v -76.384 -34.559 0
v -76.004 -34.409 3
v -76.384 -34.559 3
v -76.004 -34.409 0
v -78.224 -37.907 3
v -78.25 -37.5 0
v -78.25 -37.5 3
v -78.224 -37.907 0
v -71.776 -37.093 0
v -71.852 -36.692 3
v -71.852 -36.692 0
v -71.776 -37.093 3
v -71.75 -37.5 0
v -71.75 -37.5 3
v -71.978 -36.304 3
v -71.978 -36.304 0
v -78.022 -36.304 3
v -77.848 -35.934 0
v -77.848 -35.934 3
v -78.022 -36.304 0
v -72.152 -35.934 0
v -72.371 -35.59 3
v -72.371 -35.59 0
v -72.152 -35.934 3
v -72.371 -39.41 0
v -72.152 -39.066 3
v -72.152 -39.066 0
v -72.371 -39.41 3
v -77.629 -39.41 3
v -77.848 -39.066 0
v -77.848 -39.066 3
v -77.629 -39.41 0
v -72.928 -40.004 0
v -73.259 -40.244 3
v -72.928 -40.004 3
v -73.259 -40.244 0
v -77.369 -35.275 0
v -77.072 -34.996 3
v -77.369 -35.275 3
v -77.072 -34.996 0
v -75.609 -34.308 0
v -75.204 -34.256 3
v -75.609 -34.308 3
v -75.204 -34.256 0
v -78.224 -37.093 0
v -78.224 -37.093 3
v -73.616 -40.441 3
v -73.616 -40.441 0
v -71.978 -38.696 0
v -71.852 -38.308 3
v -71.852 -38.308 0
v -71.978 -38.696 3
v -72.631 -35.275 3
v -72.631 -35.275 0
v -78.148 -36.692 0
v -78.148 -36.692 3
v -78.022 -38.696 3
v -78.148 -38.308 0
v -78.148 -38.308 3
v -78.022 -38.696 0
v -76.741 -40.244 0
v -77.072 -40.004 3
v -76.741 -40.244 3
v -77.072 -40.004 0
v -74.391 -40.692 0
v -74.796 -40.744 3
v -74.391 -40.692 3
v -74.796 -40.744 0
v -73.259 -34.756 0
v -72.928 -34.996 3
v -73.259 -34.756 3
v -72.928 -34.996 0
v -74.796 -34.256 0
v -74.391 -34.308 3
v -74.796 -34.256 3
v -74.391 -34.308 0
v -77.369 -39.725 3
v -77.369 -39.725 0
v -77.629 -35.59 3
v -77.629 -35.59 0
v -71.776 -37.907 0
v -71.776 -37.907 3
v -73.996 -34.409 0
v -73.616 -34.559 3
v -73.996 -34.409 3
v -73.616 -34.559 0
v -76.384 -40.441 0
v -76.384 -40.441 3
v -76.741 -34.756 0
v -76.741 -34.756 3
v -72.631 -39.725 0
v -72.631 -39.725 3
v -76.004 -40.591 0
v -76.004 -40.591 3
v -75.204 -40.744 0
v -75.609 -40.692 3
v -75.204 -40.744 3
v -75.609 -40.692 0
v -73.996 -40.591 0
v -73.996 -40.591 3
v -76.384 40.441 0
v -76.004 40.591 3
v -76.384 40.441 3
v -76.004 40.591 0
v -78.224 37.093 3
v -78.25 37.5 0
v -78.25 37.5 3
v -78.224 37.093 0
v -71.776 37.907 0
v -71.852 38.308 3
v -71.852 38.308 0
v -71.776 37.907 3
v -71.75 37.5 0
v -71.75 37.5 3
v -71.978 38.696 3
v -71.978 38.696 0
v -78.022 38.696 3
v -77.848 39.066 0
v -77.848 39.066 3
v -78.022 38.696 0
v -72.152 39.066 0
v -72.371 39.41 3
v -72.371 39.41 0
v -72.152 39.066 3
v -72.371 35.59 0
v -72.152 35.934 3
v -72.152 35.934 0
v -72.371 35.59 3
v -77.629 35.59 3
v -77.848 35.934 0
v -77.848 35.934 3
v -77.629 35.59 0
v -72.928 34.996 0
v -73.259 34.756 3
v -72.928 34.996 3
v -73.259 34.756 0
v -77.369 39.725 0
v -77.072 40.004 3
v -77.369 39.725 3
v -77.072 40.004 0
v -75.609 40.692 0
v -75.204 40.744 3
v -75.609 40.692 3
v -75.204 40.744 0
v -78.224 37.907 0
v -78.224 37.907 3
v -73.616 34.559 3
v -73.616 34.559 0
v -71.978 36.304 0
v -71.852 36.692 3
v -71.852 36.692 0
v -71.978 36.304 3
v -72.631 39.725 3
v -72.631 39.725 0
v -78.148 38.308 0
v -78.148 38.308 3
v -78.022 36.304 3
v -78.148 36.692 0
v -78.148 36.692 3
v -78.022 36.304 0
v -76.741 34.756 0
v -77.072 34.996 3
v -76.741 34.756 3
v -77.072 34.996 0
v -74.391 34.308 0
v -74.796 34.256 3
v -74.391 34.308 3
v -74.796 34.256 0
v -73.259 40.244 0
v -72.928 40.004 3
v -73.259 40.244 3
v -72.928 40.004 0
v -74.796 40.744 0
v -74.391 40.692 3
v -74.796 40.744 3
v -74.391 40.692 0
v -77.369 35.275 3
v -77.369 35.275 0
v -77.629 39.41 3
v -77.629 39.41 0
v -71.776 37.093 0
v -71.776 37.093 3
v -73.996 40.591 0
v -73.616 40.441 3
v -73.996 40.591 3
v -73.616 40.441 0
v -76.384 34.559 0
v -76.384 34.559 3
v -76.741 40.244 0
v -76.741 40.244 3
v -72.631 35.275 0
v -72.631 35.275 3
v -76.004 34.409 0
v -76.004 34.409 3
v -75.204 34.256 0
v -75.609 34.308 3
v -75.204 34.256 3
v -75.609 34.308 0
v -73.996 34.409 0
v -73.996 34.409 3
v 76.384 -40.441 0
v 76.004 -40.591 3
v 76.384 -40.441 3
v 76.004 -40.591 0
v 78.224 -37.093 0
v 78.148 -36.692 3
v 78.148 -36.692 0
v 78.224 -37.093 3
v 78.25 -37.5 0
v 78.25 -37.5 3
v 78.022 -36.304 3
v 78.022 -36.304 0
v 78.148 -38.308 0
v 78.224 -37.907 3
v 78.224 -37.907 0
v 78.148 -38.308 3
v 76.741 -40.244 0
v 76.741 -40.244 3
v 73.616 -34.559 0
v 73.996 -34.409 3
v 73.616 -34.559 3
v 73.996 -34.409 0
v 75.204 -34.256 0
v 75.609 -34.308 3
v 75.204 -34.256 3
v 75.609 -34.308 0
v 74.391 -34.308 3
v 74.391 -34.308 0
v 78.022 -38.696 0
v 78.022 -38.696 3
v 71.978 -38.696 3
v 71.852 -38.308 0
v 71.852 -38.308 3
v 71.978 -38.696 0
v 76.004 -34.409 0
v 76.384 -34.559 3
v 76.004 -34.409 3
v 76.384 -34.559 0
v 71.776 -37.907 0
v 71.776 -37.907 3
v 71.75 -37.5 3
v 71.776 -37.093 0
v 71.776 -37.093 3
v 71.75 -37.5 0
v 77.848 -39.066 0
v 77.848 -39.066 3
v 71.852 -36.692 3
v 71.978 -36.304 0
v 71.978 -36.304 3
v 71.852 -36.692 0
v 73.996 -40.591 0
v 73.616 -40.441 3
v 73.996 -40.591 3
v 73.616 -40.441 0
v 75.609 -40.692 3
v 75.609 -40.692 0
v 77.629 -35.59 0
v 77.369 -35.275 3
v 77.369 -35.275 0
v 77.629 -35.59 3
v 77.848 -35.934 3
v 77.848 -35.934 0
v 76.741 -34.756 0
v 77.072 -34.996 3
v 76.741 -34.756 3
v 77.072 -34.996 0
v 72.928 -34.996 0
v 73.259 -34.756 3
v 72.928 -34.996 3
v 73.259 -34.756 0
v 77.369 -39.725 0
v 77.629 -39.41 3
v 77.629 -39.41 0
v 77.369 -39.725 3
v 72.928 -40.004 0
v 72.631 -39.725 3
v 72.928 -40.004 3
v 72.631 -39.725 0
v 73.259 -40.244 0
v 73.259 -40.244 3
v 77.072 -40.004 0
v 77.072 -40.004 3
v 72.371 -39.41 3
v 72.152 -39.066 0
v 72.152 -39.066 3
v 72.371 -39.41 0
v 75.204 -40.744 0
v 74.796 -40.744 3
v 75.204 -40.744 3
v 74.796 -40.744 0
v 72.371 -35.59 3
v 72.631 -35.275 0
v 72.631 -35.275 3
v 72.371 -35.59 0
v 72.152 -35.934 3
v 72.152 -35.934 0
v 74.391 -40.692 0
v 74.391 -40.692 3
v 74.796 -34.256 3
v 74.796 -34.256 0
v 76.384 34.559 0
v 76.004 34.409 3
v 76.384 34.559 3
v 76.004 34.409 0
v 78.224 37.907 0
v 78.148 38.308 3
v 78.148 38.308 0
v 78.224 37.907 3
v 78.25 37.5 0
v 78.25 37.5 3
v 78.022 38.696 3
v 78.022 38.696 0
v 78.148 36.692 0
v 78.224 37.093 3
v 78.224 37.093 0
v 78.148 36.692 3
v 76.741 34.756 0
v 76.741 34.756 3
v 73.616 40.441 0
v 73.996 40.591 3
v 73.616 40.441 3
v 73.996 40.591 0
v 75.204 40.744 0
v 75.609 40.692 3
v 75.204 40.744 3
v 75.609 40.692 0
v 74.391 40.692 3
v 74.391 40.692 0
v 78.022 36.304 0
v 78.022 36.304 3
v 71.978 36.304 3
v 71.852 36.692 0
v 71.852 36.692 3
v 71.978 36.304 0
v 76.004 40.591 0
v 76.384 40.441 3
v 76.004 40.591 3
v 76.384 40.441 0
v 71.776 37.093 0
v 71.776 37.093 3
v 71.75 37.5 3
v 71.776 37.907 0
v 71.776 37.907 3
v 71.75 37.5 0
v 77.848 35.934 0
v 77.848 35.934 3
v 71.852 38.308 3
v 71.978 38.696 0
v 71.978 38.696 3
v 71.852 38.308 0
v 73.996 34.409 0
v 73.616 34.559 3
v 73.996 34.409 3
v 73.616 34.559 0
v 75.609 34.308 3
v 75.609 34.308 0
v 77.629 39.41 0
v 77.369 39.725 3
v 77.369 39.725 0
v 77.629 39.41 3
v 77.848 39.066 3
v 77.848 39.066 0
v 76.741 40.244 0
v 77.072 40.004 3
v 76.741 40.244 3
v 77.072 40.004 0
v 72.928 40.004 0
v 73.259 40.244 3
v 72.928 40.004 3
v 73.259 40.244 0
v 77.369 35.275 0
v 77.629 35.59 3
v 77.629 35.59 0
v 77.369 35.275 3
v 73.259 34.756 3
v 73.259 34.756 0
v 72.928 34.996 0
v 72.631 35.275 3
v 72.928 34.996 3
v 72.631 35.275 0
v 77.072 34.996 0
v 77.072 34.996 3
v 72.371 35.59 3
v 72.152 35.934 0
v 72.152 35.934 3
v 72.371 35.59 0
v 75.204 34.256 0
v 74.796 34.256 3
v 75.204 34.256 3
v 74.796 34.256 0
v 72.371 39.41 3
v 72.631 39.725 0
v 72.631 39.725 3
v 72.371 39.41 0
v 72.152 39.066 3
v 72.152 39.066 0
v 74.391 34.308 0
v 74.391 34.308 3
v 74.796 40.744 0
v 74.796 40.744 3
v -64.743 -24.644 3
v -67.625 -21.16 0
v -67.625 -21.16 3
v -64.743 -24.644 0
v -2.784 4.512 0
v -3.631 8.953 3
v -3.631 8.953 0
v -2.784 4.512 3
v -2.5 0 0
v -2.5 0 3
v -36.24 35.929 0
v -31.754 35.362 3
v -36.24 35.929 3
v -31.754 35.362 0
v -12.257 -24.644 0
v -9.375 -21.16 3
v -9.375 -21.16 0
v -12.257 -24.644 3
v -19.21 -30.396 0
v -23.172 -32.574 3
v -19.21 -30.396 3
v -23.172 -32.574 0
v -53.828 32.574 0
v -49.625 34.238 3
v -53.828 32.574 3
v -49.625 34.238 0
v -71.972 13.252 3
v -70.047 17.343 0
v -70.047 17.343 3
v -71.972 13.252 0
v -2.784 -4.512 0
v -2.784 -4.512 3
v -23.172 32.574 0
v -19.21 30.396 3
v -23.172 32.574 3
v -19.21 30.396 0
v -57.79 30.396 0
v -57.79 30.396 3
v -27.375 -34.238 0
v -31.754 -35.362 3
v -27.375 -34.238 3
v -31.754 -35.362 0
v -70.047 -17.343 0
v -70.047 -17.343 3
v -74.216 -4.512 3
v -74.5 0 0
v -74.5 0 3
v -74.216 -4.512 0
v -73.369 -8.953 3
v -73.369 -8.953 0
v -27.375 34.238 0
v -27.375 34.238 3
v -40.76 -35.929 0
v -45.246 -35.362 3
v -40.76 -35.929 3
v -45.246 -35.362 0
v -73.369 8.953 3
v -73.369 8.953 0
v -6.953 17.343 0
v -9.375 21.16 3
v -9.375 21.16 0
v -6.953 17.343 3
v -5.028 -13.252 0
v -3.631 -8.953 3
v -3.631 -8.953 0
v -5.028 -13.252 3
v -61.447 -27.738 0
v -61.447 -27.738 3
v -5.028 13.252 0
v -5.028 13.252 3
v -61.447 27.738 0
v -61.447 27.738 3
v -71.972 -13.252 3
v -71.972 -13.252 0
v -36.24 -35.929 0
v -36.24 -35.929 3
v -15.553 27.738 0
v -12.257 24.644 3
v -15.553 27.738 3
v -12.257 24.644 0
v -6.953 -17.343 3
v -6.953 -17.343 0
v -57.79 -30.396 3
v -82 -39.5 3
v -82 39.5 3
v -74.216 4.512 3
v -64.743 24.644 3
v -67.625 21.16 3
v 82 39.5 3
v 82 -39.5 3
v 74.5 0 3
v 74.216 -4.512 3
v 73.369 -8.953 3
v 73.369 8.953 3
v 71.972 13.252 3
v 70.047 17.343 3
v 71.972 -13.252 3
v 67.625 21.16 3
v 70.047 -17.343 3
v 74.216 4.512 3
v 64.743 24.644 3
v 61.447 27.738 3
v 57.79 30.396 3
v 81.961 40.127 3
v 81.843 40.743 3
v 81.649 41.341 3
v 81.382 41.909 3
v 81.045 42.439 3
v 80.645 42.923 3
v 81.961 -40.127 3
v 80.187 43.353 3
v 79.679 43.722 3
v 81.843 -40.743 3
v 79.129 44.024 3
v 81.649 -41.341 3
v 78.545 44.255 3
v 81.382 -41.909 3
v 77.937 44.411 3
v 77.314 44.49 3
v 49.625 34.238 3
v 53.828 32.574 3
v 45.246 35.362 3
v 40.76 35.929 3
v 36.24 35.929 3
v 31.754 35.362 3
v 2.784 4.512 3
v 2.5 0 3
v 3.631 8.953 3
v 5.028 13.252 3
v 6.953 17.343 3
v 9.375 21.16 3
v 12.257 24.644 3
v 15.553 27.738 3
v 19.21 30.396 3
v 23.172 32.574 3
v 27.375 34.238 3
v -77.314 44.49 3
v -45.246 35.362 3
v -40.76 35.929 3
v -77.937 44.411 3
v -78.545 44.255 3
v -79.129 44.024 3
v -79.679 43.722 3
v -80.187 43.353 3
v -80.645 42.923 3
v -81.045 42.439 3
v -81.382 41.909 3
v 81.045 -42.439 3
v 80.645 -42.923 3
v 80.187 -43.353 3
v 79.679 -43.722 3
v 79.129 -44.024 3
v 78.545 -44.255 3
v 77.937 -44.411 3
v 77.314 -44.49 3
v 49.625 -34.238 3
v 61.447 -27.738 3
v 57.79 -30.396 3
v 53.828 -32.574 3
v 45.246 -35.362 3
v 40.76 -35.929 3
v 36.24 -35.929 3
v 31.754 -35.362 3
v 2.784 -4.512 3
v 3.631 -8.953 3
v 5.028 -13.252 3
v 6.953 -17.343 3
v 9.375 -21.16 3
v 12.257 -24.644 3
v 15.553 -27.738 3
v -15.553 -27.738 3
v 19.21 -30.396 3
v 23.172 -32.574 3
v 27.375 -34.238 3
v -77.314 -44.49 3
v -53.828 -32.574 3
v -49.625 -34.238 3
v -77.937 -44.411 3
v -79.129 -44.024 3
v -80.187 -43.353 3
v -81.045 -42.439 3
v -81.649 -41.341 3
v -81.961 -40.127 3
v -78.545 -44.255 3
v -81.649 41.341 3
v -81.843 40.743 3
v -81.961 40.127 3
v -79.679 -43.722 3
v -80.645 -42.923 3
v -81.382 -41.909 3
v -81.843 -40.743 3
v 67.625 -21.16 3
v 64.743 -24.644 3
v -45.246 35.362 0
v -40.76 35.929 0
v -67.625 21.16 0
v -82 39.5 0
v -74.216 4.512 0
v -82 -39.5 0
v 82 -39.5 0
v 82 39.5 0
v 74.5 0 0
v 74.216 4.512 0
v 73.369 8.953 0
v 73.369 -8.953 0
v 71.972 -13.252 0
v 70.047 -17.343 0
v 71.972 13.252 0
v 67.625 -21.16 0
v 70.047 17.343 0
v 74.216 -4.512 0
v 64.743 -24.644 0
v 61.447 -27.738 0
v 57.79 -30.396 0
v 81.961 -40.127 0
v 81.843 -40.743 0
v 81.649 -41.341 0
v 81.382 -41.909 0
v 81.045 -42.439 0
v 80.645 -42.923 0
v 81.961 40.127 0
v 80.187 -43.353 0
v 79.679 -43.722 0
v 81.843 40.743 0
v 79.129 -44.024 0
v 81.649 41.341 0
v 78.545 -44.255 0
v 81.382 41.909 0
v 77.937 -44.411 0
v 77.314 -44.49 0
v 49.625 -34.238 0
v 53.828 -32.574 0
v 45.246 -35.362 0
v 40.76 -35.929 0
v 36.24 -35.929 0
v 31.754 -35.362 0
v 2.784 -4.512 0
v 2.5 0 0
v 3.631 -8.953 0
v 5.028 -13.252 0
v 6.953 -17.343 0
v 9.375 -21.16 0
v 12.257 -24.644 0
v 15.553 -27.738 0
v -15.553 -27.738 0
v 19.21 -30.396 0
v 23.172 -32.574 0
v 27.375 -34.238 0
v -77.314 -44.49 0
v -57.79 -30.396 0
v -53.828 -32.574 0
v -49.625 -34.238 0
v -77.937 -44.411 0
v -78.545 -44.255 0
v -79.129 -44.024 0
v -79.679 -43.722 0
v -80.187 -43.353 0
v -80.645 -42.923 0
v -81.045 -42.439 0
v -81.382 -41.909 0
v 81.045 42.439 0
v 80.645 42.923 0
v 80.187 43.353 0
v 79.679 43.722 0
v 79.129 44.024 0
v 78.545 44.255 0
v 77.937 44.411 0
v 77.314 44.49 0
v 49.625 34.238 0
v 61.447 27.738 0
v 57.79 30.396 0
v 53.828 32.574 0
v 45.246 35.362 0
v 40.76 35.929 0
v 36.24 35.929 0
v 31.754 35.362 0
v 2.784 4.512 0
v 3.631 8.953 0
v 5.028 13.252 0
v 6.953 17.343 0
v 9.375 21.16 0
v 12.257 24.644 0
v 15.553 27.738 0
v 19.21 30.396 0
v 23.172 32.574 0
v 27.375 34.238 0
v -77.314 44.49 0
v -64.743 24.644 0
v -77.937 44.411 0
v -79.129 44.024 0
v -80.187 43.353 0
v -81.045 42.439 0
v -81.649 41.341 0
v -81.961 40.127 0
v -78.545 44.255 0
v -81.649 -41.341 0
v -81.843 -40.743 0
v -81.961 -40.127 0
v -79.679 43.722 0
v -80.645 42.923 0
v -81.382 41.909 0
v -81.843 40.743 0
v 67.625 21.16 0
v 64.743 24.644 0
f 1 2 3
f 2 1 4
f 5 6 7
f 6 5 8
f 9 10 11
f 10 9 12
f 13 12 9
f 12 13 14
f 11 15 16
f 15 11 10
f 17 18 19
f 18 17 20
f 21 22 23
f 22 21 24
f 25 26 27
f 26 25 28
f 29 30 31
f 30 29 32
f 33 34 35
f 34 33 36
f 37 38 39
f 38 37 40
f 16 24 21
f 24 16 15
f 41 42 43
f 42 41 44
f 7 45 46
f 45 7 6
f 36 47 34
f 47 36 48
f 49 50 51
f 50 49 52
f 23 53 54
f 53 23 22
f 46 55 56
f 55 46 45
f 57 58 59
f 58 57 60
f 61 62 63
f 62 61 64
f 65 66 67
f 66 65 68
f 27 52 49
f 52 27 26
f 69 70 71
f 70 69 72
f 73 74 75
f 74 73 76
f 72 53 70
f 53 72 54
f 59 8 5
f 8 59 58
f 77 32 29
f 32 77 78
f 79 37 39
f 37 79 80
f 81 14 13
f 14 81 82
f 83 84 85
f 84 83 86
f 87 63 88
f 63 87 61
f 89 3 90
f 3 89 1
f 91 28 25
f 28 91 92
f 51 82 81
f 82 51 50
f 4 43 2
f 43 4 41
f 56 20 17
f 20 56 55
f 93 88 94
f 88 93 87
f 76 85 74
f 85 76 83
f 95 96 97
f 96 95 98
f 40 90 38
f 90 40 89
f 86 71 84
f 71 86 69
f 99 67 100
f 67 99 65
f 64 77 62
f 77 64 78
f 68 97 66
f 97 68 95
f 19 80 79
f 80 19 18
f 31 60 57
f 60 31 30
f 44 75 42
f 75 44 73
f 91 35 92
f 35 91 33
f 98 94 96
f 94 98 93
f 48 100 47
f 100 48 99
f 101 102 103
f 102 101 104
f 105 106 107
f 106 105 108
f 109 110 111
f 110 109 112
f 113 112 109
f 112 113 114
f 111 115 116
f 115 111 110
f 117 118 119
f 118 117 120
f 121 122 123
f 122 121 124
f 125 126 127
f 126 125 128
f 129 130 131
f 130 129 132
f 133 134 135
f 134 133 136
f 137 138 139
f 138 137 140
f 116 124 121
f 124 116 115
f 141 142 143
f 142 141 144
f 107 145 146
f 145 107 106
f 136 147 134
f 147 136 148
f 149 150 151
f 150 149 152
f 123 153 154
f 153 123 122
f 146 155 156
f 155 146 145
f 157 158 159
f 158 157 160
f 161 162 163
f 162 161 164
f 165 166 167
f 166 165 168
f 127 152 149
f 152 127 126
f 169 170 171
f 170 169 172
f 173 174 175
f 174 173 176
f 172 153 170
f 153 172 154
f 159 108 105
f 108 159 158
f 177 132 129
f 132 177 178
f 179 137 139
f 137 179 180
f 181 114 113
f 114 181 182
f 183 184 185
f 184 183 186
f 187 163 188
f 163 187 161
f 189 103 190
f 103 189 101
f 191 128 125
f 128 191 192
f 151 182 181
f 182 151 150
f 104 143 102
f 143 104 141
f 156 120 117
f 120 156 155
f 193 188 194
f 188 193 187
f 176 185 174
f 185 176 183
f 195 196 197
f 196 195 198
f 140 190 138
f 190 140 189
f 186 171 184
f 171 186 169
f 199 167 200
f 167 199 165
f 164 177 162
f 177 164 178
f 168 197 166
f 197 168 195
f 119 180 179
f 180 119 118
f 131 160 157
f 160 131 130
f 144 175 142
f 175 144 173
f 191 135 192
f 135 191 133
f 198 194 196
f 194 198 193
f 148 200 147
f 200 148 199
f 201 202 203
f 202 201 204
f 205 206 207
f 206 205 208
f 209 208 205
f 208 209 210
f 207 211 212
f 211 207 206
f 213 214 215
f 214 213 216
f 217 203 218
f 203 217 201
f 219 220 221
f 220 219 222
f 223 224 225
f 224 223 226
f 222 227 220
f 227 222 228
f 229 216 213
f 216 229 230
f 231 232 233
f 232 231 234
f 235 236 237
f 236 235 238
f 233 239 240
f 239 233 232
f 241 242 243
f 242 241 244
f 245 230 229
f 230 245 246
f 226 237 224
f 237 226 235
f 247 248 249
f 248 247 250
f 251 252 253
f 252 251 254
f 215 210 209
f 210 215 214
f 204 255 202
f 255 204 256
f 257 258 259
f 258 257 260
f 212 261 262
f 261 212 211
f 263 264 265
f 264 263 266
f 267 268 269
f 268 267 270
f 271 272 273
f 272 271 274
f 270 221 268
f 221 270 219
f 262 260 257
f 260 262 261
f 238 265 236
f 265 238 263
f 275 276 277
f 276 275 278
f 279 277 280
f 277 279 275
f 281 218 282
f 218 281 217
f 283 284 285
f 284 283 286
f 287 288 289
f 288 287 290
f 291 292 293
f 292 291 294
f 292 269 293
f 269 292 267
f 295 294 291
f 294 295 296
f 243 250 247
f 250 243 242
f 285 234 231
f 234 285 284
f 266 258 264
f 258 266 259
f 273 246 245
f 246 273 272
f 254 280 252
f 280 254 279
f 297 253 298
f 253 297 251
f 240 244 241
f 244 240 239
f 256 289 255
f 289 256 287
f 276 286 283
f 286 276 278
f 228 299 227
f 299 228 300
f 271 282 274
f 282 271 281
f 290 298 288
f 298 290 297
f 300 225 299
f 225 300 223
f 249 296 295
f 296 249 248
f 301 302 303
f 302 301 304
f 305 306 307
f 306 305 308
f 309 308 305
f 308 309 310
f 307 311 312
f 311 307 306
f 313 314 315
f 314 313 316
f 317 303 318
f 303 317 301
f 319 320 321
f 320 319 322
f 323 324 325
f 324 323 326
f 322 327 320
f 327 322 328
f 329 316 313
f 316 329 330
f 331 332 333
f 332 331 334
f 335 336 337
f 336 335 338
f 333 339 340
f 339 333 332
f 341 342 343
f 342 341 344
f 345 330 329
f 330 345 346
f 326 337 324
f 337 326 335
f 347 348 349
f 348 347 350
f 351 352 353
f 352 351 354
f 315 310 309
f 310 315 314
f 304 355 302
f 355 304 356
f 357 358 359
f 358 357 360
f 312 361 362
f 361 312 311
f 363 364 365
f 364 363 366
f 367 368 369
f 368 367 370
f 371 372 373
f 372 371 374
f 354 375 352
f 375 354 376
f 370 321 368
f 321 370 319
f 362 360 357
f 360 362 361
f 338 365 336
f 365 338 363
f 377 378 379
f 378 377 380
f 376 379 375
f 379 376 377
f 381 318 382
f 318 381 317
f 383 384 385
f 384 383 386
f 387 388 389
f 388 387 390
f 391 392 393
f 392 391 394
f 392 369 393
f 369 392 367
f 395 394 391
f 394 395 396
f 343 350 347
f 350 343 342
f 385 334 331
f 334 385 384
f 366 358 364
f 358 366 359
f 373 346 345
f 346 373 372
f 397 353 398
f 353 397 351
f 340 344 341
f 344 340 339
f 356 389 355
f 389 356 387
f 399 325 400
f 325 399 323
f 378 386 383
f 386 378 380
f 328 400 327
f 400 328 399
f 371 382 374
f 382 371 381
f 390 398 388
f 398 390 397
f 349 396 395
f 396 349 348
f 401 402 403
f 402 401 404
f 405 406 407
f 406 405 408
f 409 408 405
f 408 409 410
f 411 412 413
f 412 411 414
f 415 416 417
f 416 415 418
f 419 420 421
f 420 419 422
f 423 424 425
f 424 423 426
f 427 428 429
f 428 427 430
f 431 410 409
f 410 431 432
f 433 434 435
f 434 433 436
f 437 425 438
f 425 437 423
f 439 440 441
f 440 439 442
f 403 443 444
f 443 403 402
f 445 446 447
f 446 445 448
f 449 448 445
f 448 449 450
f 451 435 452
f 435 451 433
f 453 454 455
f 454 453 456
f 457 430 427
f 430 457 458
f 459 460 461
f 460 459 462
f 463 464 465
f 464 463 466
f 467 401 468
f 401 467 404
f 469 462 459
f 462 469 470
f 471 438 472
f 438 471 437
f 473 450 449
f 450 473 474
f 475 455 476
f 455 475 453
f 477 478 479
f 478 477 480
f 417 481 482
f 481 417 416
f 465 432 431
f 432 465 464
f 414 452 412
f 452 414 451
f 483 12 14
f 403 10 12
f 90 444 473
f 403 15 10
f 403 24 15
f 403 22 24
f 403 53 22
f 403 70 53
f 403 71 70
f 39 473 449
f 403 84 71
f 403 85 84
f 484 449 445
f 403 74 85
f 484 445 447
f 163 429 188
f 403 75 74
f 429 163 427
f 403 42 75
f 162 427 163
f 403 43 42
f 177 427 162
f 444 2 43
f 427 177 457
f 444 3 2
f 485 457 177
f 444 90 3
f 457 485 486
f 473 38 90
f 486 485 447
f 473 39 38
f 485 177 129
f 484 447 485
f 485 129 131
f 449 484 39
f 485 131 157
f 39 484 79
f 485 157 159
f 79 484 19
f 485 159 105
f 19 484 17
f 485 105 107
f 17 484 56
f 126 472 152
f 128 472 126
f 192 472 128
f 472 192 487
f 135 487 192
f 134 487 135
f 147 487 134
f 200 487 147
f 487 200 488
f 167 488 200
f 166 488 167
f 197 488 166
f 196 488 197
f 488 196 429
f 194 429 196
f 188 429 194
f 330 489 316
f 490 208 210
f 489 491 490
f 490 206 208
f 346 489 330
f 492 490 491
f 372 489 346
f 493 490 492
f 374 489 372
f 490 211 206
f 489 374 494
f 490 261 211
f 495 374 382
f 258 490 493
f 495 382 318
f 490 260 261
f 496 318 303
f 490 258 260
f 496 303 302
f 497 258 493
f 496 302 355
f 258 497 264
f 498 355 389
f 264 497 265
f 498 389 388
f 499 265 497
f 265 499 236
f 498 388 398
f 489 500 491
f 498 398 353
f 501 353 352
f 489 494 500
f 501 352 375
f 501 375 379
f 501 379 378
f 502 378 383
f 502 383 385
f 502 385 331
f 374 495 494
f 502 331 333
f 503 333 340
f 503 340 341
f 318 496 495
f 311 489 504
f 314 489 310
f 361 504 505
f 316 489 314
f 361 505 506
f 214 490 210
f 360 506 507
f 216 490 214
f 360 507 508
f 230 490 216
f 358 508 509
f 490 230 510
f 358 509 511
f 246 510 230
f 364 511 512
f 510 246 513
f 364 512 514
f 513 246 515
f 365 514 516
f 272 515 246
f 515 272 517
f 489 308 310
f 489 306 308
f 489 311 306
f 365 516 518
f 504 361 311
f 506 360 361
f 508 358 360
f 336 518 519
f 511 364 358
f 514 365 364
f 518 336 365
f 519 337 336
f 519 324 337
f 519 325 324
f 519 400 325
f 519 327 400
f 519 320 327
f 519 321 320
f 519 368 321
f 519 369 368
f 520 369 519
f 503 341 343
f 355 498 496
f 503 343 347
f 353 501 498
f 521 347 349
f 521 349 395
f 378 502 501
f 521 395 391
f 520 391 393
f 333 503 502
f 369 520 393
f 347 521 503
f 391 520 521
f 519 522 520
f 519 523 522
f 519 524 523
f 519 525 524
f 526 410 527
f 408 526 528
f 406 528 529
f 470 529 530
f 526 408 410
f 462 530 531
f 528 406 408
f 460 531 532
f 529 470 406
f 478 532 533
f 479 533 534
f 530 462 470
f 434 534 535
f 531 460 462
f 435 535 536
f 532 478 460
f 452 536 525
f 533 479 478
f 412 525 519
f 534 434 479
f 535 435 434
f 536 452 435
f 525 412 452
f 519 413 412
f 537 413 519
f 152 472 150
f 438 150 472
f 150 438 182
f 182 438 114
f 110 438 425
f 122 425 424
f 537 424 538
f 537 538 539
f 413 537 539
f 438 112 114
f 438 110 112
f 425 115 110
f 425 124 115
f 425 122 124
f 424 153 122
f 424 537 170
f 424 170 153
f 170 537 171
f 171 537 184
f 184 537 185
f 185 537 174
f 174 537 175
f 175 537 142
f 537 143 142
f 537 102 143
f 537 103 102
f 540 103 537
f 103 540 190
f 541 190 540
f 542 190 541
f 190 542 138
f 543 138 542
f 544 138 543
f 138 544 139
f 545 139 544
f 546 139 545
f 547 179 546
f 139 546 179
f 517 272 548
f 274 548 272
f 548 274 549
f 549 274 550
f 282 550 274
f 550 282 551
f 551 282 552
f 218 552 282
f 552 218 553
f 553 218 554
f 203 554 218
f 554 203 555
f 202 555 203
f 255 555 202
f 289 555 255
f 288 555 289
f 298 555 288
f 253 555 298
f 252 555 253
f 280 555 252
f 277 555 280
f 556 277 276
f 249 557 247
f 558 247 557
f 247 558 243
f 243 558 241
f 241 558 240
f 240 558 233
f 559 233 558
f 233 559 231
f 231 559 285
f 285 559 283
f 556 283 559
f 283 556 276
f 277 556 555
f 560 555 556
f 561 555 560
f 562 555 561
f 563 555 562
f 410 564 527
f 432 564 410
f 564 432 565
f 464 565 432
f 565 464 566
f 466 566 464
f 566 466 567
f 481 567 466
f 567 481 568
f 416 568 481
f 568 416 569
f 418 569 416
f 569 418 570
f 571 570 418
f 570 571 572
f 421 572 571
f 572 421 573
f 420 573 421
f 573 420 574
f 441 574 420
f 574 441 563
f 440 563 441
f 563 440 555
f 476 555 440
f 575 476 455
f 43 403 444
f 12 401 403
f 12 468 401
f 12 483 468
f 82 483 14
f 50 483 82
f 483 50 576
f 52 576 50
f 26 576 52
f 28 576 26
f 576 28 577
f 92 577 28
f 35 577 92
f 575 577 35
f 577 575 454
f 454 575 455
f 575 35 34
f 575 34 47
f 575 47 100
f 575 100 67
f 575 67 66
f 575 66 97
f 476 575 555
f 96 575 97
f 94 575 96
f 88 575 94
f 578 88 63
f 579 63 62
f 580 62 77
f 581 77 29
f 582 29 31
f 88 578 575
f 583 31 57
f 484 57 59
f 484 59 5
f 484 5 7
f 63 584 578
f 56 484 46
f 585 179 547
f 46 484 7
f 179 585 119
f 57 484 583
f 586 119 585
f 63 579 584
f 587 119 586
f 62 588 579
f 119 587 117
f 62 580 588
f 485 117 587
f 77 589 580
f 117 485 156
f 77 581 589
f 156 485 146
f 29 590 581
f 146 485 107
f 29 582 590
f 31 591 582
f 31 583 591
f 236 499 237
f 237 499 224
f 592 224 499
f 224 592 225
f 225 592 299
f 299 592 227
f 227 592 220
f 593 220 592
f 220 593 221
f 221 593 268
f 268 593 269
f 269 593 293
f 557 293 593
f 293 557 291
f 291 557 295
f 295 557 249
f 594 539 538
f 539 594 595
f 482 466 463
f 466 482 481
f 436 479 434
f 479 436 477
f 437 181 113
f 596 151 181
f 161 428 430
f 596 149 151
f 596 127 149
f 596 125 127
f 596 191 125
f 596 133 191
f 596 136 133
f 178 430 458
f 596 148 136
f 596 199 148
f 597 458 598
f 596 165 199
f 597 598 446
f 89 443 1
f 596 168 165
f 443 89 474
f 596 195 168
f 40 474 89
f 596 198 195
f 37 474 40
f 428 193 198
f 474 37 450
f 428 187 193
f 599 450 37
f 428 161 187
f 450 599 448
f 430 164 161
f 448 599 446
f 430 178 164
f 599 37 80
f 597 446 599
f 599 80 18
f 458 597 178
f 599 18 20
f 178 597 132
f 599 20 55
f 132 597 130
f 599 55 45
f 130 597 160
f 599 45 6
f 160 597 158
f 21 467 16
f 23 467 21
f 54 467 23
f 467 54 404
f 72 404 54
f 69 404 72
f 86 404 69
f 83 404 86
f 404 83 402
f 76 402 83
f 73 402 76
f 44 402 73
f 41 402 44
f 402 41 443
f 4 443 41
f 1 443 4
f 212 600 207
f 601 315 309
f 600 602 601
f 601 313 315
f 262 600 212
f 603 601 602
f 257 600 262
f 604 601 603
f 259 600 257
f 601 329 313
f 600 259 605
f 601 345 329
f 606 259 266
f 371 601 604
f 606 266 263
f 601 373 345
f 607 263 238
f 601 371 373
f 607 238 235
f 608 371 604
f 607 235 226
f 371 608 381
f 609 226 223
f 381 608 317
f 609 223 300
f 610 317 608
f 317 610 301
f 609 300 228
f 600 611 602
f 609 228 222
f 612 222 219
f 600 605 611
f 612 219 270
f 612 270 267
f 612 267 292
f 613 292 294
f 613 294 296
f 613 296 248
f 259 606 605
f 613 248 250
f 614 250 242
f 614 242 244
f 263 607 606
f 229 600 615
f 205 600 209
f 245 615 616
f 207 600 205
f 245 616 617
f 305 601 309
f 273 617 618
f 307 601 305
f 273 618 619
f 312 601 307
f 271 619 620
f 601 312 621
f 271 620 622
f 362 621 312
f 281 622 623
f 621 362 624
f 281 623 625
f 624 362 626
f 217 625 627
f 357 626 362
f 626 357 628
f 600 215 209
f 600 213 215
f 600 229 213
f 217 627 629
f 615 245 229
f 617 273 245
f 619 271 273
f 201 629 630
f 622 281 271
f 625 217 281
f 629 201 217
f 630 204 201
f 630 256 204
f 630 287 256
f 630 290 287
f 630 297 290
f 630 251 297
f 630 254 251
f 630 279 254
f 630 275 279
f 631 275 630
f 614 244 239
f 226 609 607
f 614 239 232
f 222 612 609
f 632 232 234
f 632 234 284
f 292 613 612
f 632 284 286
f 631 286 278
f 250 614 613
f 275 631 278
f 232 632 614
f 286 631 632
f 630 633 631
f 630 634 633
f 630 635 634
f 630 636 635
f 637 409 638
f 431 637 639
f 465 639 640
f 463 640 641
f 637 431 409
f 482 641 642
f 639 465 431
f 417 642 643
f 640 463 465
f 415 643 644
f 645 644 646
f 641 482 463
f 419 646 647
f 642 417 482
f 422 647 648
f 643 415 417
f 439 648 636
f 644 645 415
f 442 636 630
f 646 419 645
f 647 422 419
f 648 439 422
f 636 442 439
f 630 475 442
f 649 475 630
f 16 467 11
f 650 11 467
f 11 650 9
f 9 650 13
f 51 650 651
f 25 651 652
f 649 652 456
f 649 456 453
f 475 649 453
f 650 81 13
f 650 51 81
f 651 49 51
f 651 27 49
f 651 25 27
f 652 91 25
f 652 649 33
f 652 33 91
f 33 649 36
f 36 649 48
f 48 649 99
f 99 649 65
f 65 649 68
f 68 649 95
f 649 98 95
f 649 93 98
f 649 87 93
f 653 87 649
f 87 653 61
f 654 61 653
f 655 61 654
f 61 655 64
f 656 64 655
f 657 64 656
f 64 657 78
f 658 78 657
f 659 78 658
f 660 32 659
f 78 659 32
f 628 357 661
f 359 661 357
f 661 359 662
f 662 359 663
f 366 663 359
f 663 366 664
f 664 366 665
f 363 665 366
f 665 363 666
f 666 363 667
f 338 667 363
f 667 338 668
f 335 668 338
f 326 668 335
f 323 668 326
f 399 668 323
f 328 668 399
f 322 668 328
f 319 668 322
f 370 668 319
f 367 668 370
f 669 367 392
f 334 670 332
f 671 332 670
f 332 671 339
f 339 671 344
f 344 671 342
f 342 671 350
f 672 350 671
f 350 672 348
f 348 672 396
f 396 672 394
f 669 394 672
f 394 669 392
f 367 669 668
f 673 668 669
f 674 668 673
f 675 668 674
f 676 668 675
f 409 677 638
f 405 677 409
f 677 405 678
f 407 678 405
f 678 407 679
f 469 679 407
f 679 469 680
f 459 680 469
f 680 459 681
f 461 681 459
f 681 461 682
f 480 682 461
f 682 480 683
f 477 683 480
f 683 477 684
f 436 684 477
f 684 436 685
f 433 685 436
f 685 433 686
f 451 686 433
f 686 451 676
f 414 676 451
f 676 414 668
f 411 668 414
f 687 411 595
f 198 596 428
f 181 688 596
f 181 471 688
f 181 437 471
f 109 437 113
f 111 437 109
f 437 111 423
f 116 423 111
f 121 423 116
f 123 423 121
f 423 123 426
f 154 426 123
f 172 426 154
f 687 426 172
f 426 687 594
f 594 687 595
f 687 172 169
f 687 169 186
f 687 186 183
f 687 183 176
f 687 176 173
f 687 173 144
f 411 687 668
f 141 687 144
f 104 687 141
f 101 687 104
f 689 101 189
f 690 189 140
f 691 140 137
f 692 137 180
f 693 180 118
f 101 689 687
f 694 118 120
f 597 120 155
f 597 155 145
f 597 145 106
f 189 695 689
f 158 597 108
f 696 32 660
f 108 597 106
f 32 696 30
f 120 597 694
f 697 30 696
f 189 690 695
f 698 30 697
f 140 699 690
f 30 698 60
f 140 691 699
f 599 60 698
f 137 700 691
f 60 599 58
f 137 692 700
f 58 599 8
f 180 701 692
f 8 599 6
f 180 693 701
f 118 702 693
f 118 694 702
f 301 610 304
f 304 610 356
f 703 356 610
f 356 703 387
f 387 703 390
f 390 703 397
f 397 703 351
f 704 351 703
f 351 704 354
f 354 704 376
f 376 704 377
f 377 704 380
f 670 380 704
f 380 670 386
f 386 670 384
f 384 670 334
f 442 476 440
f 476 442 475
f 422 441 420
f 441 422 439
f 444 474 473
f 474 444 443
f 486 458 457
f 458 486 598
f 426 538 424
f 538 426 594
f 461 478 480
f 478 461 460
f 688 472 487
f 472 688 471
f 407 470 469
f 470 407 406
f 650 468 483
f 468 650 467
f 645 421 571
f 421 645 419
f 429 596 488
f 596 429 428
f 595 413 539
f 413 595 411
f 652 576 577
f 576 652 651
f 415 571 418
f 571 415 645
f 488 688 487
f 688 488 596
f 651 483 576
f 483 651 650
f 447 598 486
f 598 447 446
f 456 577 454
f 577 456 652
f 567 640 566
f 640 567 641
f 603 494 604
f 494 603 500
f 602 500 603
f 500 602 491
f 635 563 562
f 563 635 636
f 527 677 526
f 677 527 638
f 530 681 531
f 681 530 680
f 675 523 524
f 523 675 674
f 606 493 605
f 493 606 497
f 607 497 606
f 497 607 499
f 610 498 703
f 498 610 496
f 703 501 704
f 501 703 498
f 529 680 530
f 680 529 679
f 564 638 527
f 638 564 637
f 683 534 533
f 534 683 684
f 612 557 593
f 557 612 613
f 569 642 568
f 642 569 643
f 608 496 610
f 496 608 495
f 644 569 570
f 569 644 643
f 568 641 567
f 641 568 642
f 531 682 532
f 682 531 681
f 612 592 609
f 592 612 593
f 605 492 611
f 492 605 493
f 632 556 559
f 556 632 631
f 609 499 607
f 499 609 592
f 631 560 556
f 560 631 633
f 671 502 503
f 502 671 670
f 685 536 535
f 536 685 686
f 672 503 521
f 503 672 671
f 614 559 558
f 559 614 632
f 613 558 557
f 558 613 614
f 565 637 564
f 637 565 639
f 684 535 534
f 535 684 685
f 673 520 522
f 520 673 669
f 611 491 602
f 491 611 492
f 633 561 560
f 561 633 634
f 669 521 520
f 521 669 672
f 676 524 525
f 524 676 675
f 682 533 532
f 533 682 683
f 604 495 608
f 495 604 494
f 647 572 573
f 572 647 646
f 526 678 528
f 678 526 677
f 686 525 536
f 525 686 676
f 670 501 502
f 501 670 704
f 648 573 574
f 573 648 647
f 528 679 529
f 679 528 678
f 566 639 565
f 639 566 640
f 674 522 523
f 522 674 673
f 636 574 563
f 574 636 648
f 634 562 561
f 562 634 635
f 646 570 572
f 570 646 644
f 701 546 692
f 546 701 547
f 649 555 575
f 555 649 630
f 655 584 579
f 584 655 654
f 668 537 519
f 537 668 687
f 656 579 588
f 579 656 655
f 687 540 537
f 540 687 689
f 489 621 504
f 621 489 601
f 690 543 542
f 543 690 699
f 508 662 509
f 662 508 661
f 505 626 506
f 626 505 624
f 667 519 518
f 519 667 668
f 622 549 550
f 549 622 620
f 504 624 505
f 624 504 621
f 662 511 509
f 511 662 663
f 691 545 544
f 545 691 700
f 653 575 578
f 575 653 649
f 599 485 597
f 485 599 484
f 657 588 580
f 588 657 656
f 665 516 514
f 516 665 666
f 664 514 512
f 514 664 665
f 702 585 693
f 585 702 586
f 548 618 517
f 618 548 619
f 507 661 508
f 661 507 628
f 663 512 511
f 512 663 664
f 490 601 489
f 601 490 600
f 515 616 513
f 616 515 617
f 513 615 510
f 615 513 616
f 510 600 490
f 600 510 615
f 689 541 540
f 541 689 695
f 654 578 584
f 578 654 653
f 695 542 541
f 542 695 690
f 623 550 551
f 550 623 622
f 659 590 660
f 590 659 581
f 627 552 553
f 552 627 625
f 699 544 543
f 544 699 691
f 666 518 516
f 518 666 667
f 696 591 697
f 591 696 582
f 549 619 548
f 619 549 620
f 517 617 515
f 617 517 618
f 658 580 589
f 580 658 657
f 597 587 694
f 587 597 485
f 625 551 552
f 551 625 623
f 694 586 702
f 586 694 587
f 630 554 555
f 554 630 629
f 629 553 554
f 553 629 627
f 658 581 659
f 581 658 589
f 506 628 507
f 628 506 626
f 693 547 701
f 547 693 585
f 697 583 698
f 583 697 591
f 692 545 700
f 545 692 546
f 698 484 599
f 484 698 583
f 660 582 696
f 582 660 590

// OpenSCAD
$fn = 50;

difference() {
	union() {
		hull() {
			translate(v = [-77.0, 39.5, 0]) {
				cylinder(h = 3, r = 5);
			}
			translate(v = [77.0, 39.5, 0]) {
				cylinder(h = 3, r = 5);
			}
			translate(v = [-77.0, -39.5, 0]) {
				cylinder(h = 3, r = 5);
			}
			translate(v = [77.0, -39.5, 0]) {
				cylinder(h = 3, r = 5);
			}
		}
	}
	union() {
		translate(v = [-75.0, -37.5, -100.0]) {
			cylinder(h = 200, r = 3.25);
		}
		translate(v = [-75.0, 37.5, -100.0]) {
			cylinder(h = 200, r = 3.25);
		}
		translate(v = [75.0, -37.5, -100.0]) {
			cylinder(h = 200, r = 3.25);
		}
		translate(v = [75.0, 37.5, -100.0]) {
			cylinder(h = 200, r = 3.25);
		}
		translate(v = [-75.0, -37.5, -100.0]) {
			cylinder(h = 200, r = 1.8);
		}
		translate(v = [-75.0, 37.5, -100.0]) {
			cylinder(h = 200, r = 1.8);
		}
		translate(v = [75.0, -37.5, -100.0]) {
			cylinder(h = 200, r = 1.8);
		}
		translate(v = [75.0, 37.5, -100.0]) {
			cylinder(h = 200, r = 1.8);
		}
		translate(v = [-38.5, 0, 0.0]) {
			cylinder(h = 3, r = 36.0);
		}
		translate(v = [38.5, 0, 0.0]) {
			cylinder(h = 3, r = 36.0);
		}
	}
}
